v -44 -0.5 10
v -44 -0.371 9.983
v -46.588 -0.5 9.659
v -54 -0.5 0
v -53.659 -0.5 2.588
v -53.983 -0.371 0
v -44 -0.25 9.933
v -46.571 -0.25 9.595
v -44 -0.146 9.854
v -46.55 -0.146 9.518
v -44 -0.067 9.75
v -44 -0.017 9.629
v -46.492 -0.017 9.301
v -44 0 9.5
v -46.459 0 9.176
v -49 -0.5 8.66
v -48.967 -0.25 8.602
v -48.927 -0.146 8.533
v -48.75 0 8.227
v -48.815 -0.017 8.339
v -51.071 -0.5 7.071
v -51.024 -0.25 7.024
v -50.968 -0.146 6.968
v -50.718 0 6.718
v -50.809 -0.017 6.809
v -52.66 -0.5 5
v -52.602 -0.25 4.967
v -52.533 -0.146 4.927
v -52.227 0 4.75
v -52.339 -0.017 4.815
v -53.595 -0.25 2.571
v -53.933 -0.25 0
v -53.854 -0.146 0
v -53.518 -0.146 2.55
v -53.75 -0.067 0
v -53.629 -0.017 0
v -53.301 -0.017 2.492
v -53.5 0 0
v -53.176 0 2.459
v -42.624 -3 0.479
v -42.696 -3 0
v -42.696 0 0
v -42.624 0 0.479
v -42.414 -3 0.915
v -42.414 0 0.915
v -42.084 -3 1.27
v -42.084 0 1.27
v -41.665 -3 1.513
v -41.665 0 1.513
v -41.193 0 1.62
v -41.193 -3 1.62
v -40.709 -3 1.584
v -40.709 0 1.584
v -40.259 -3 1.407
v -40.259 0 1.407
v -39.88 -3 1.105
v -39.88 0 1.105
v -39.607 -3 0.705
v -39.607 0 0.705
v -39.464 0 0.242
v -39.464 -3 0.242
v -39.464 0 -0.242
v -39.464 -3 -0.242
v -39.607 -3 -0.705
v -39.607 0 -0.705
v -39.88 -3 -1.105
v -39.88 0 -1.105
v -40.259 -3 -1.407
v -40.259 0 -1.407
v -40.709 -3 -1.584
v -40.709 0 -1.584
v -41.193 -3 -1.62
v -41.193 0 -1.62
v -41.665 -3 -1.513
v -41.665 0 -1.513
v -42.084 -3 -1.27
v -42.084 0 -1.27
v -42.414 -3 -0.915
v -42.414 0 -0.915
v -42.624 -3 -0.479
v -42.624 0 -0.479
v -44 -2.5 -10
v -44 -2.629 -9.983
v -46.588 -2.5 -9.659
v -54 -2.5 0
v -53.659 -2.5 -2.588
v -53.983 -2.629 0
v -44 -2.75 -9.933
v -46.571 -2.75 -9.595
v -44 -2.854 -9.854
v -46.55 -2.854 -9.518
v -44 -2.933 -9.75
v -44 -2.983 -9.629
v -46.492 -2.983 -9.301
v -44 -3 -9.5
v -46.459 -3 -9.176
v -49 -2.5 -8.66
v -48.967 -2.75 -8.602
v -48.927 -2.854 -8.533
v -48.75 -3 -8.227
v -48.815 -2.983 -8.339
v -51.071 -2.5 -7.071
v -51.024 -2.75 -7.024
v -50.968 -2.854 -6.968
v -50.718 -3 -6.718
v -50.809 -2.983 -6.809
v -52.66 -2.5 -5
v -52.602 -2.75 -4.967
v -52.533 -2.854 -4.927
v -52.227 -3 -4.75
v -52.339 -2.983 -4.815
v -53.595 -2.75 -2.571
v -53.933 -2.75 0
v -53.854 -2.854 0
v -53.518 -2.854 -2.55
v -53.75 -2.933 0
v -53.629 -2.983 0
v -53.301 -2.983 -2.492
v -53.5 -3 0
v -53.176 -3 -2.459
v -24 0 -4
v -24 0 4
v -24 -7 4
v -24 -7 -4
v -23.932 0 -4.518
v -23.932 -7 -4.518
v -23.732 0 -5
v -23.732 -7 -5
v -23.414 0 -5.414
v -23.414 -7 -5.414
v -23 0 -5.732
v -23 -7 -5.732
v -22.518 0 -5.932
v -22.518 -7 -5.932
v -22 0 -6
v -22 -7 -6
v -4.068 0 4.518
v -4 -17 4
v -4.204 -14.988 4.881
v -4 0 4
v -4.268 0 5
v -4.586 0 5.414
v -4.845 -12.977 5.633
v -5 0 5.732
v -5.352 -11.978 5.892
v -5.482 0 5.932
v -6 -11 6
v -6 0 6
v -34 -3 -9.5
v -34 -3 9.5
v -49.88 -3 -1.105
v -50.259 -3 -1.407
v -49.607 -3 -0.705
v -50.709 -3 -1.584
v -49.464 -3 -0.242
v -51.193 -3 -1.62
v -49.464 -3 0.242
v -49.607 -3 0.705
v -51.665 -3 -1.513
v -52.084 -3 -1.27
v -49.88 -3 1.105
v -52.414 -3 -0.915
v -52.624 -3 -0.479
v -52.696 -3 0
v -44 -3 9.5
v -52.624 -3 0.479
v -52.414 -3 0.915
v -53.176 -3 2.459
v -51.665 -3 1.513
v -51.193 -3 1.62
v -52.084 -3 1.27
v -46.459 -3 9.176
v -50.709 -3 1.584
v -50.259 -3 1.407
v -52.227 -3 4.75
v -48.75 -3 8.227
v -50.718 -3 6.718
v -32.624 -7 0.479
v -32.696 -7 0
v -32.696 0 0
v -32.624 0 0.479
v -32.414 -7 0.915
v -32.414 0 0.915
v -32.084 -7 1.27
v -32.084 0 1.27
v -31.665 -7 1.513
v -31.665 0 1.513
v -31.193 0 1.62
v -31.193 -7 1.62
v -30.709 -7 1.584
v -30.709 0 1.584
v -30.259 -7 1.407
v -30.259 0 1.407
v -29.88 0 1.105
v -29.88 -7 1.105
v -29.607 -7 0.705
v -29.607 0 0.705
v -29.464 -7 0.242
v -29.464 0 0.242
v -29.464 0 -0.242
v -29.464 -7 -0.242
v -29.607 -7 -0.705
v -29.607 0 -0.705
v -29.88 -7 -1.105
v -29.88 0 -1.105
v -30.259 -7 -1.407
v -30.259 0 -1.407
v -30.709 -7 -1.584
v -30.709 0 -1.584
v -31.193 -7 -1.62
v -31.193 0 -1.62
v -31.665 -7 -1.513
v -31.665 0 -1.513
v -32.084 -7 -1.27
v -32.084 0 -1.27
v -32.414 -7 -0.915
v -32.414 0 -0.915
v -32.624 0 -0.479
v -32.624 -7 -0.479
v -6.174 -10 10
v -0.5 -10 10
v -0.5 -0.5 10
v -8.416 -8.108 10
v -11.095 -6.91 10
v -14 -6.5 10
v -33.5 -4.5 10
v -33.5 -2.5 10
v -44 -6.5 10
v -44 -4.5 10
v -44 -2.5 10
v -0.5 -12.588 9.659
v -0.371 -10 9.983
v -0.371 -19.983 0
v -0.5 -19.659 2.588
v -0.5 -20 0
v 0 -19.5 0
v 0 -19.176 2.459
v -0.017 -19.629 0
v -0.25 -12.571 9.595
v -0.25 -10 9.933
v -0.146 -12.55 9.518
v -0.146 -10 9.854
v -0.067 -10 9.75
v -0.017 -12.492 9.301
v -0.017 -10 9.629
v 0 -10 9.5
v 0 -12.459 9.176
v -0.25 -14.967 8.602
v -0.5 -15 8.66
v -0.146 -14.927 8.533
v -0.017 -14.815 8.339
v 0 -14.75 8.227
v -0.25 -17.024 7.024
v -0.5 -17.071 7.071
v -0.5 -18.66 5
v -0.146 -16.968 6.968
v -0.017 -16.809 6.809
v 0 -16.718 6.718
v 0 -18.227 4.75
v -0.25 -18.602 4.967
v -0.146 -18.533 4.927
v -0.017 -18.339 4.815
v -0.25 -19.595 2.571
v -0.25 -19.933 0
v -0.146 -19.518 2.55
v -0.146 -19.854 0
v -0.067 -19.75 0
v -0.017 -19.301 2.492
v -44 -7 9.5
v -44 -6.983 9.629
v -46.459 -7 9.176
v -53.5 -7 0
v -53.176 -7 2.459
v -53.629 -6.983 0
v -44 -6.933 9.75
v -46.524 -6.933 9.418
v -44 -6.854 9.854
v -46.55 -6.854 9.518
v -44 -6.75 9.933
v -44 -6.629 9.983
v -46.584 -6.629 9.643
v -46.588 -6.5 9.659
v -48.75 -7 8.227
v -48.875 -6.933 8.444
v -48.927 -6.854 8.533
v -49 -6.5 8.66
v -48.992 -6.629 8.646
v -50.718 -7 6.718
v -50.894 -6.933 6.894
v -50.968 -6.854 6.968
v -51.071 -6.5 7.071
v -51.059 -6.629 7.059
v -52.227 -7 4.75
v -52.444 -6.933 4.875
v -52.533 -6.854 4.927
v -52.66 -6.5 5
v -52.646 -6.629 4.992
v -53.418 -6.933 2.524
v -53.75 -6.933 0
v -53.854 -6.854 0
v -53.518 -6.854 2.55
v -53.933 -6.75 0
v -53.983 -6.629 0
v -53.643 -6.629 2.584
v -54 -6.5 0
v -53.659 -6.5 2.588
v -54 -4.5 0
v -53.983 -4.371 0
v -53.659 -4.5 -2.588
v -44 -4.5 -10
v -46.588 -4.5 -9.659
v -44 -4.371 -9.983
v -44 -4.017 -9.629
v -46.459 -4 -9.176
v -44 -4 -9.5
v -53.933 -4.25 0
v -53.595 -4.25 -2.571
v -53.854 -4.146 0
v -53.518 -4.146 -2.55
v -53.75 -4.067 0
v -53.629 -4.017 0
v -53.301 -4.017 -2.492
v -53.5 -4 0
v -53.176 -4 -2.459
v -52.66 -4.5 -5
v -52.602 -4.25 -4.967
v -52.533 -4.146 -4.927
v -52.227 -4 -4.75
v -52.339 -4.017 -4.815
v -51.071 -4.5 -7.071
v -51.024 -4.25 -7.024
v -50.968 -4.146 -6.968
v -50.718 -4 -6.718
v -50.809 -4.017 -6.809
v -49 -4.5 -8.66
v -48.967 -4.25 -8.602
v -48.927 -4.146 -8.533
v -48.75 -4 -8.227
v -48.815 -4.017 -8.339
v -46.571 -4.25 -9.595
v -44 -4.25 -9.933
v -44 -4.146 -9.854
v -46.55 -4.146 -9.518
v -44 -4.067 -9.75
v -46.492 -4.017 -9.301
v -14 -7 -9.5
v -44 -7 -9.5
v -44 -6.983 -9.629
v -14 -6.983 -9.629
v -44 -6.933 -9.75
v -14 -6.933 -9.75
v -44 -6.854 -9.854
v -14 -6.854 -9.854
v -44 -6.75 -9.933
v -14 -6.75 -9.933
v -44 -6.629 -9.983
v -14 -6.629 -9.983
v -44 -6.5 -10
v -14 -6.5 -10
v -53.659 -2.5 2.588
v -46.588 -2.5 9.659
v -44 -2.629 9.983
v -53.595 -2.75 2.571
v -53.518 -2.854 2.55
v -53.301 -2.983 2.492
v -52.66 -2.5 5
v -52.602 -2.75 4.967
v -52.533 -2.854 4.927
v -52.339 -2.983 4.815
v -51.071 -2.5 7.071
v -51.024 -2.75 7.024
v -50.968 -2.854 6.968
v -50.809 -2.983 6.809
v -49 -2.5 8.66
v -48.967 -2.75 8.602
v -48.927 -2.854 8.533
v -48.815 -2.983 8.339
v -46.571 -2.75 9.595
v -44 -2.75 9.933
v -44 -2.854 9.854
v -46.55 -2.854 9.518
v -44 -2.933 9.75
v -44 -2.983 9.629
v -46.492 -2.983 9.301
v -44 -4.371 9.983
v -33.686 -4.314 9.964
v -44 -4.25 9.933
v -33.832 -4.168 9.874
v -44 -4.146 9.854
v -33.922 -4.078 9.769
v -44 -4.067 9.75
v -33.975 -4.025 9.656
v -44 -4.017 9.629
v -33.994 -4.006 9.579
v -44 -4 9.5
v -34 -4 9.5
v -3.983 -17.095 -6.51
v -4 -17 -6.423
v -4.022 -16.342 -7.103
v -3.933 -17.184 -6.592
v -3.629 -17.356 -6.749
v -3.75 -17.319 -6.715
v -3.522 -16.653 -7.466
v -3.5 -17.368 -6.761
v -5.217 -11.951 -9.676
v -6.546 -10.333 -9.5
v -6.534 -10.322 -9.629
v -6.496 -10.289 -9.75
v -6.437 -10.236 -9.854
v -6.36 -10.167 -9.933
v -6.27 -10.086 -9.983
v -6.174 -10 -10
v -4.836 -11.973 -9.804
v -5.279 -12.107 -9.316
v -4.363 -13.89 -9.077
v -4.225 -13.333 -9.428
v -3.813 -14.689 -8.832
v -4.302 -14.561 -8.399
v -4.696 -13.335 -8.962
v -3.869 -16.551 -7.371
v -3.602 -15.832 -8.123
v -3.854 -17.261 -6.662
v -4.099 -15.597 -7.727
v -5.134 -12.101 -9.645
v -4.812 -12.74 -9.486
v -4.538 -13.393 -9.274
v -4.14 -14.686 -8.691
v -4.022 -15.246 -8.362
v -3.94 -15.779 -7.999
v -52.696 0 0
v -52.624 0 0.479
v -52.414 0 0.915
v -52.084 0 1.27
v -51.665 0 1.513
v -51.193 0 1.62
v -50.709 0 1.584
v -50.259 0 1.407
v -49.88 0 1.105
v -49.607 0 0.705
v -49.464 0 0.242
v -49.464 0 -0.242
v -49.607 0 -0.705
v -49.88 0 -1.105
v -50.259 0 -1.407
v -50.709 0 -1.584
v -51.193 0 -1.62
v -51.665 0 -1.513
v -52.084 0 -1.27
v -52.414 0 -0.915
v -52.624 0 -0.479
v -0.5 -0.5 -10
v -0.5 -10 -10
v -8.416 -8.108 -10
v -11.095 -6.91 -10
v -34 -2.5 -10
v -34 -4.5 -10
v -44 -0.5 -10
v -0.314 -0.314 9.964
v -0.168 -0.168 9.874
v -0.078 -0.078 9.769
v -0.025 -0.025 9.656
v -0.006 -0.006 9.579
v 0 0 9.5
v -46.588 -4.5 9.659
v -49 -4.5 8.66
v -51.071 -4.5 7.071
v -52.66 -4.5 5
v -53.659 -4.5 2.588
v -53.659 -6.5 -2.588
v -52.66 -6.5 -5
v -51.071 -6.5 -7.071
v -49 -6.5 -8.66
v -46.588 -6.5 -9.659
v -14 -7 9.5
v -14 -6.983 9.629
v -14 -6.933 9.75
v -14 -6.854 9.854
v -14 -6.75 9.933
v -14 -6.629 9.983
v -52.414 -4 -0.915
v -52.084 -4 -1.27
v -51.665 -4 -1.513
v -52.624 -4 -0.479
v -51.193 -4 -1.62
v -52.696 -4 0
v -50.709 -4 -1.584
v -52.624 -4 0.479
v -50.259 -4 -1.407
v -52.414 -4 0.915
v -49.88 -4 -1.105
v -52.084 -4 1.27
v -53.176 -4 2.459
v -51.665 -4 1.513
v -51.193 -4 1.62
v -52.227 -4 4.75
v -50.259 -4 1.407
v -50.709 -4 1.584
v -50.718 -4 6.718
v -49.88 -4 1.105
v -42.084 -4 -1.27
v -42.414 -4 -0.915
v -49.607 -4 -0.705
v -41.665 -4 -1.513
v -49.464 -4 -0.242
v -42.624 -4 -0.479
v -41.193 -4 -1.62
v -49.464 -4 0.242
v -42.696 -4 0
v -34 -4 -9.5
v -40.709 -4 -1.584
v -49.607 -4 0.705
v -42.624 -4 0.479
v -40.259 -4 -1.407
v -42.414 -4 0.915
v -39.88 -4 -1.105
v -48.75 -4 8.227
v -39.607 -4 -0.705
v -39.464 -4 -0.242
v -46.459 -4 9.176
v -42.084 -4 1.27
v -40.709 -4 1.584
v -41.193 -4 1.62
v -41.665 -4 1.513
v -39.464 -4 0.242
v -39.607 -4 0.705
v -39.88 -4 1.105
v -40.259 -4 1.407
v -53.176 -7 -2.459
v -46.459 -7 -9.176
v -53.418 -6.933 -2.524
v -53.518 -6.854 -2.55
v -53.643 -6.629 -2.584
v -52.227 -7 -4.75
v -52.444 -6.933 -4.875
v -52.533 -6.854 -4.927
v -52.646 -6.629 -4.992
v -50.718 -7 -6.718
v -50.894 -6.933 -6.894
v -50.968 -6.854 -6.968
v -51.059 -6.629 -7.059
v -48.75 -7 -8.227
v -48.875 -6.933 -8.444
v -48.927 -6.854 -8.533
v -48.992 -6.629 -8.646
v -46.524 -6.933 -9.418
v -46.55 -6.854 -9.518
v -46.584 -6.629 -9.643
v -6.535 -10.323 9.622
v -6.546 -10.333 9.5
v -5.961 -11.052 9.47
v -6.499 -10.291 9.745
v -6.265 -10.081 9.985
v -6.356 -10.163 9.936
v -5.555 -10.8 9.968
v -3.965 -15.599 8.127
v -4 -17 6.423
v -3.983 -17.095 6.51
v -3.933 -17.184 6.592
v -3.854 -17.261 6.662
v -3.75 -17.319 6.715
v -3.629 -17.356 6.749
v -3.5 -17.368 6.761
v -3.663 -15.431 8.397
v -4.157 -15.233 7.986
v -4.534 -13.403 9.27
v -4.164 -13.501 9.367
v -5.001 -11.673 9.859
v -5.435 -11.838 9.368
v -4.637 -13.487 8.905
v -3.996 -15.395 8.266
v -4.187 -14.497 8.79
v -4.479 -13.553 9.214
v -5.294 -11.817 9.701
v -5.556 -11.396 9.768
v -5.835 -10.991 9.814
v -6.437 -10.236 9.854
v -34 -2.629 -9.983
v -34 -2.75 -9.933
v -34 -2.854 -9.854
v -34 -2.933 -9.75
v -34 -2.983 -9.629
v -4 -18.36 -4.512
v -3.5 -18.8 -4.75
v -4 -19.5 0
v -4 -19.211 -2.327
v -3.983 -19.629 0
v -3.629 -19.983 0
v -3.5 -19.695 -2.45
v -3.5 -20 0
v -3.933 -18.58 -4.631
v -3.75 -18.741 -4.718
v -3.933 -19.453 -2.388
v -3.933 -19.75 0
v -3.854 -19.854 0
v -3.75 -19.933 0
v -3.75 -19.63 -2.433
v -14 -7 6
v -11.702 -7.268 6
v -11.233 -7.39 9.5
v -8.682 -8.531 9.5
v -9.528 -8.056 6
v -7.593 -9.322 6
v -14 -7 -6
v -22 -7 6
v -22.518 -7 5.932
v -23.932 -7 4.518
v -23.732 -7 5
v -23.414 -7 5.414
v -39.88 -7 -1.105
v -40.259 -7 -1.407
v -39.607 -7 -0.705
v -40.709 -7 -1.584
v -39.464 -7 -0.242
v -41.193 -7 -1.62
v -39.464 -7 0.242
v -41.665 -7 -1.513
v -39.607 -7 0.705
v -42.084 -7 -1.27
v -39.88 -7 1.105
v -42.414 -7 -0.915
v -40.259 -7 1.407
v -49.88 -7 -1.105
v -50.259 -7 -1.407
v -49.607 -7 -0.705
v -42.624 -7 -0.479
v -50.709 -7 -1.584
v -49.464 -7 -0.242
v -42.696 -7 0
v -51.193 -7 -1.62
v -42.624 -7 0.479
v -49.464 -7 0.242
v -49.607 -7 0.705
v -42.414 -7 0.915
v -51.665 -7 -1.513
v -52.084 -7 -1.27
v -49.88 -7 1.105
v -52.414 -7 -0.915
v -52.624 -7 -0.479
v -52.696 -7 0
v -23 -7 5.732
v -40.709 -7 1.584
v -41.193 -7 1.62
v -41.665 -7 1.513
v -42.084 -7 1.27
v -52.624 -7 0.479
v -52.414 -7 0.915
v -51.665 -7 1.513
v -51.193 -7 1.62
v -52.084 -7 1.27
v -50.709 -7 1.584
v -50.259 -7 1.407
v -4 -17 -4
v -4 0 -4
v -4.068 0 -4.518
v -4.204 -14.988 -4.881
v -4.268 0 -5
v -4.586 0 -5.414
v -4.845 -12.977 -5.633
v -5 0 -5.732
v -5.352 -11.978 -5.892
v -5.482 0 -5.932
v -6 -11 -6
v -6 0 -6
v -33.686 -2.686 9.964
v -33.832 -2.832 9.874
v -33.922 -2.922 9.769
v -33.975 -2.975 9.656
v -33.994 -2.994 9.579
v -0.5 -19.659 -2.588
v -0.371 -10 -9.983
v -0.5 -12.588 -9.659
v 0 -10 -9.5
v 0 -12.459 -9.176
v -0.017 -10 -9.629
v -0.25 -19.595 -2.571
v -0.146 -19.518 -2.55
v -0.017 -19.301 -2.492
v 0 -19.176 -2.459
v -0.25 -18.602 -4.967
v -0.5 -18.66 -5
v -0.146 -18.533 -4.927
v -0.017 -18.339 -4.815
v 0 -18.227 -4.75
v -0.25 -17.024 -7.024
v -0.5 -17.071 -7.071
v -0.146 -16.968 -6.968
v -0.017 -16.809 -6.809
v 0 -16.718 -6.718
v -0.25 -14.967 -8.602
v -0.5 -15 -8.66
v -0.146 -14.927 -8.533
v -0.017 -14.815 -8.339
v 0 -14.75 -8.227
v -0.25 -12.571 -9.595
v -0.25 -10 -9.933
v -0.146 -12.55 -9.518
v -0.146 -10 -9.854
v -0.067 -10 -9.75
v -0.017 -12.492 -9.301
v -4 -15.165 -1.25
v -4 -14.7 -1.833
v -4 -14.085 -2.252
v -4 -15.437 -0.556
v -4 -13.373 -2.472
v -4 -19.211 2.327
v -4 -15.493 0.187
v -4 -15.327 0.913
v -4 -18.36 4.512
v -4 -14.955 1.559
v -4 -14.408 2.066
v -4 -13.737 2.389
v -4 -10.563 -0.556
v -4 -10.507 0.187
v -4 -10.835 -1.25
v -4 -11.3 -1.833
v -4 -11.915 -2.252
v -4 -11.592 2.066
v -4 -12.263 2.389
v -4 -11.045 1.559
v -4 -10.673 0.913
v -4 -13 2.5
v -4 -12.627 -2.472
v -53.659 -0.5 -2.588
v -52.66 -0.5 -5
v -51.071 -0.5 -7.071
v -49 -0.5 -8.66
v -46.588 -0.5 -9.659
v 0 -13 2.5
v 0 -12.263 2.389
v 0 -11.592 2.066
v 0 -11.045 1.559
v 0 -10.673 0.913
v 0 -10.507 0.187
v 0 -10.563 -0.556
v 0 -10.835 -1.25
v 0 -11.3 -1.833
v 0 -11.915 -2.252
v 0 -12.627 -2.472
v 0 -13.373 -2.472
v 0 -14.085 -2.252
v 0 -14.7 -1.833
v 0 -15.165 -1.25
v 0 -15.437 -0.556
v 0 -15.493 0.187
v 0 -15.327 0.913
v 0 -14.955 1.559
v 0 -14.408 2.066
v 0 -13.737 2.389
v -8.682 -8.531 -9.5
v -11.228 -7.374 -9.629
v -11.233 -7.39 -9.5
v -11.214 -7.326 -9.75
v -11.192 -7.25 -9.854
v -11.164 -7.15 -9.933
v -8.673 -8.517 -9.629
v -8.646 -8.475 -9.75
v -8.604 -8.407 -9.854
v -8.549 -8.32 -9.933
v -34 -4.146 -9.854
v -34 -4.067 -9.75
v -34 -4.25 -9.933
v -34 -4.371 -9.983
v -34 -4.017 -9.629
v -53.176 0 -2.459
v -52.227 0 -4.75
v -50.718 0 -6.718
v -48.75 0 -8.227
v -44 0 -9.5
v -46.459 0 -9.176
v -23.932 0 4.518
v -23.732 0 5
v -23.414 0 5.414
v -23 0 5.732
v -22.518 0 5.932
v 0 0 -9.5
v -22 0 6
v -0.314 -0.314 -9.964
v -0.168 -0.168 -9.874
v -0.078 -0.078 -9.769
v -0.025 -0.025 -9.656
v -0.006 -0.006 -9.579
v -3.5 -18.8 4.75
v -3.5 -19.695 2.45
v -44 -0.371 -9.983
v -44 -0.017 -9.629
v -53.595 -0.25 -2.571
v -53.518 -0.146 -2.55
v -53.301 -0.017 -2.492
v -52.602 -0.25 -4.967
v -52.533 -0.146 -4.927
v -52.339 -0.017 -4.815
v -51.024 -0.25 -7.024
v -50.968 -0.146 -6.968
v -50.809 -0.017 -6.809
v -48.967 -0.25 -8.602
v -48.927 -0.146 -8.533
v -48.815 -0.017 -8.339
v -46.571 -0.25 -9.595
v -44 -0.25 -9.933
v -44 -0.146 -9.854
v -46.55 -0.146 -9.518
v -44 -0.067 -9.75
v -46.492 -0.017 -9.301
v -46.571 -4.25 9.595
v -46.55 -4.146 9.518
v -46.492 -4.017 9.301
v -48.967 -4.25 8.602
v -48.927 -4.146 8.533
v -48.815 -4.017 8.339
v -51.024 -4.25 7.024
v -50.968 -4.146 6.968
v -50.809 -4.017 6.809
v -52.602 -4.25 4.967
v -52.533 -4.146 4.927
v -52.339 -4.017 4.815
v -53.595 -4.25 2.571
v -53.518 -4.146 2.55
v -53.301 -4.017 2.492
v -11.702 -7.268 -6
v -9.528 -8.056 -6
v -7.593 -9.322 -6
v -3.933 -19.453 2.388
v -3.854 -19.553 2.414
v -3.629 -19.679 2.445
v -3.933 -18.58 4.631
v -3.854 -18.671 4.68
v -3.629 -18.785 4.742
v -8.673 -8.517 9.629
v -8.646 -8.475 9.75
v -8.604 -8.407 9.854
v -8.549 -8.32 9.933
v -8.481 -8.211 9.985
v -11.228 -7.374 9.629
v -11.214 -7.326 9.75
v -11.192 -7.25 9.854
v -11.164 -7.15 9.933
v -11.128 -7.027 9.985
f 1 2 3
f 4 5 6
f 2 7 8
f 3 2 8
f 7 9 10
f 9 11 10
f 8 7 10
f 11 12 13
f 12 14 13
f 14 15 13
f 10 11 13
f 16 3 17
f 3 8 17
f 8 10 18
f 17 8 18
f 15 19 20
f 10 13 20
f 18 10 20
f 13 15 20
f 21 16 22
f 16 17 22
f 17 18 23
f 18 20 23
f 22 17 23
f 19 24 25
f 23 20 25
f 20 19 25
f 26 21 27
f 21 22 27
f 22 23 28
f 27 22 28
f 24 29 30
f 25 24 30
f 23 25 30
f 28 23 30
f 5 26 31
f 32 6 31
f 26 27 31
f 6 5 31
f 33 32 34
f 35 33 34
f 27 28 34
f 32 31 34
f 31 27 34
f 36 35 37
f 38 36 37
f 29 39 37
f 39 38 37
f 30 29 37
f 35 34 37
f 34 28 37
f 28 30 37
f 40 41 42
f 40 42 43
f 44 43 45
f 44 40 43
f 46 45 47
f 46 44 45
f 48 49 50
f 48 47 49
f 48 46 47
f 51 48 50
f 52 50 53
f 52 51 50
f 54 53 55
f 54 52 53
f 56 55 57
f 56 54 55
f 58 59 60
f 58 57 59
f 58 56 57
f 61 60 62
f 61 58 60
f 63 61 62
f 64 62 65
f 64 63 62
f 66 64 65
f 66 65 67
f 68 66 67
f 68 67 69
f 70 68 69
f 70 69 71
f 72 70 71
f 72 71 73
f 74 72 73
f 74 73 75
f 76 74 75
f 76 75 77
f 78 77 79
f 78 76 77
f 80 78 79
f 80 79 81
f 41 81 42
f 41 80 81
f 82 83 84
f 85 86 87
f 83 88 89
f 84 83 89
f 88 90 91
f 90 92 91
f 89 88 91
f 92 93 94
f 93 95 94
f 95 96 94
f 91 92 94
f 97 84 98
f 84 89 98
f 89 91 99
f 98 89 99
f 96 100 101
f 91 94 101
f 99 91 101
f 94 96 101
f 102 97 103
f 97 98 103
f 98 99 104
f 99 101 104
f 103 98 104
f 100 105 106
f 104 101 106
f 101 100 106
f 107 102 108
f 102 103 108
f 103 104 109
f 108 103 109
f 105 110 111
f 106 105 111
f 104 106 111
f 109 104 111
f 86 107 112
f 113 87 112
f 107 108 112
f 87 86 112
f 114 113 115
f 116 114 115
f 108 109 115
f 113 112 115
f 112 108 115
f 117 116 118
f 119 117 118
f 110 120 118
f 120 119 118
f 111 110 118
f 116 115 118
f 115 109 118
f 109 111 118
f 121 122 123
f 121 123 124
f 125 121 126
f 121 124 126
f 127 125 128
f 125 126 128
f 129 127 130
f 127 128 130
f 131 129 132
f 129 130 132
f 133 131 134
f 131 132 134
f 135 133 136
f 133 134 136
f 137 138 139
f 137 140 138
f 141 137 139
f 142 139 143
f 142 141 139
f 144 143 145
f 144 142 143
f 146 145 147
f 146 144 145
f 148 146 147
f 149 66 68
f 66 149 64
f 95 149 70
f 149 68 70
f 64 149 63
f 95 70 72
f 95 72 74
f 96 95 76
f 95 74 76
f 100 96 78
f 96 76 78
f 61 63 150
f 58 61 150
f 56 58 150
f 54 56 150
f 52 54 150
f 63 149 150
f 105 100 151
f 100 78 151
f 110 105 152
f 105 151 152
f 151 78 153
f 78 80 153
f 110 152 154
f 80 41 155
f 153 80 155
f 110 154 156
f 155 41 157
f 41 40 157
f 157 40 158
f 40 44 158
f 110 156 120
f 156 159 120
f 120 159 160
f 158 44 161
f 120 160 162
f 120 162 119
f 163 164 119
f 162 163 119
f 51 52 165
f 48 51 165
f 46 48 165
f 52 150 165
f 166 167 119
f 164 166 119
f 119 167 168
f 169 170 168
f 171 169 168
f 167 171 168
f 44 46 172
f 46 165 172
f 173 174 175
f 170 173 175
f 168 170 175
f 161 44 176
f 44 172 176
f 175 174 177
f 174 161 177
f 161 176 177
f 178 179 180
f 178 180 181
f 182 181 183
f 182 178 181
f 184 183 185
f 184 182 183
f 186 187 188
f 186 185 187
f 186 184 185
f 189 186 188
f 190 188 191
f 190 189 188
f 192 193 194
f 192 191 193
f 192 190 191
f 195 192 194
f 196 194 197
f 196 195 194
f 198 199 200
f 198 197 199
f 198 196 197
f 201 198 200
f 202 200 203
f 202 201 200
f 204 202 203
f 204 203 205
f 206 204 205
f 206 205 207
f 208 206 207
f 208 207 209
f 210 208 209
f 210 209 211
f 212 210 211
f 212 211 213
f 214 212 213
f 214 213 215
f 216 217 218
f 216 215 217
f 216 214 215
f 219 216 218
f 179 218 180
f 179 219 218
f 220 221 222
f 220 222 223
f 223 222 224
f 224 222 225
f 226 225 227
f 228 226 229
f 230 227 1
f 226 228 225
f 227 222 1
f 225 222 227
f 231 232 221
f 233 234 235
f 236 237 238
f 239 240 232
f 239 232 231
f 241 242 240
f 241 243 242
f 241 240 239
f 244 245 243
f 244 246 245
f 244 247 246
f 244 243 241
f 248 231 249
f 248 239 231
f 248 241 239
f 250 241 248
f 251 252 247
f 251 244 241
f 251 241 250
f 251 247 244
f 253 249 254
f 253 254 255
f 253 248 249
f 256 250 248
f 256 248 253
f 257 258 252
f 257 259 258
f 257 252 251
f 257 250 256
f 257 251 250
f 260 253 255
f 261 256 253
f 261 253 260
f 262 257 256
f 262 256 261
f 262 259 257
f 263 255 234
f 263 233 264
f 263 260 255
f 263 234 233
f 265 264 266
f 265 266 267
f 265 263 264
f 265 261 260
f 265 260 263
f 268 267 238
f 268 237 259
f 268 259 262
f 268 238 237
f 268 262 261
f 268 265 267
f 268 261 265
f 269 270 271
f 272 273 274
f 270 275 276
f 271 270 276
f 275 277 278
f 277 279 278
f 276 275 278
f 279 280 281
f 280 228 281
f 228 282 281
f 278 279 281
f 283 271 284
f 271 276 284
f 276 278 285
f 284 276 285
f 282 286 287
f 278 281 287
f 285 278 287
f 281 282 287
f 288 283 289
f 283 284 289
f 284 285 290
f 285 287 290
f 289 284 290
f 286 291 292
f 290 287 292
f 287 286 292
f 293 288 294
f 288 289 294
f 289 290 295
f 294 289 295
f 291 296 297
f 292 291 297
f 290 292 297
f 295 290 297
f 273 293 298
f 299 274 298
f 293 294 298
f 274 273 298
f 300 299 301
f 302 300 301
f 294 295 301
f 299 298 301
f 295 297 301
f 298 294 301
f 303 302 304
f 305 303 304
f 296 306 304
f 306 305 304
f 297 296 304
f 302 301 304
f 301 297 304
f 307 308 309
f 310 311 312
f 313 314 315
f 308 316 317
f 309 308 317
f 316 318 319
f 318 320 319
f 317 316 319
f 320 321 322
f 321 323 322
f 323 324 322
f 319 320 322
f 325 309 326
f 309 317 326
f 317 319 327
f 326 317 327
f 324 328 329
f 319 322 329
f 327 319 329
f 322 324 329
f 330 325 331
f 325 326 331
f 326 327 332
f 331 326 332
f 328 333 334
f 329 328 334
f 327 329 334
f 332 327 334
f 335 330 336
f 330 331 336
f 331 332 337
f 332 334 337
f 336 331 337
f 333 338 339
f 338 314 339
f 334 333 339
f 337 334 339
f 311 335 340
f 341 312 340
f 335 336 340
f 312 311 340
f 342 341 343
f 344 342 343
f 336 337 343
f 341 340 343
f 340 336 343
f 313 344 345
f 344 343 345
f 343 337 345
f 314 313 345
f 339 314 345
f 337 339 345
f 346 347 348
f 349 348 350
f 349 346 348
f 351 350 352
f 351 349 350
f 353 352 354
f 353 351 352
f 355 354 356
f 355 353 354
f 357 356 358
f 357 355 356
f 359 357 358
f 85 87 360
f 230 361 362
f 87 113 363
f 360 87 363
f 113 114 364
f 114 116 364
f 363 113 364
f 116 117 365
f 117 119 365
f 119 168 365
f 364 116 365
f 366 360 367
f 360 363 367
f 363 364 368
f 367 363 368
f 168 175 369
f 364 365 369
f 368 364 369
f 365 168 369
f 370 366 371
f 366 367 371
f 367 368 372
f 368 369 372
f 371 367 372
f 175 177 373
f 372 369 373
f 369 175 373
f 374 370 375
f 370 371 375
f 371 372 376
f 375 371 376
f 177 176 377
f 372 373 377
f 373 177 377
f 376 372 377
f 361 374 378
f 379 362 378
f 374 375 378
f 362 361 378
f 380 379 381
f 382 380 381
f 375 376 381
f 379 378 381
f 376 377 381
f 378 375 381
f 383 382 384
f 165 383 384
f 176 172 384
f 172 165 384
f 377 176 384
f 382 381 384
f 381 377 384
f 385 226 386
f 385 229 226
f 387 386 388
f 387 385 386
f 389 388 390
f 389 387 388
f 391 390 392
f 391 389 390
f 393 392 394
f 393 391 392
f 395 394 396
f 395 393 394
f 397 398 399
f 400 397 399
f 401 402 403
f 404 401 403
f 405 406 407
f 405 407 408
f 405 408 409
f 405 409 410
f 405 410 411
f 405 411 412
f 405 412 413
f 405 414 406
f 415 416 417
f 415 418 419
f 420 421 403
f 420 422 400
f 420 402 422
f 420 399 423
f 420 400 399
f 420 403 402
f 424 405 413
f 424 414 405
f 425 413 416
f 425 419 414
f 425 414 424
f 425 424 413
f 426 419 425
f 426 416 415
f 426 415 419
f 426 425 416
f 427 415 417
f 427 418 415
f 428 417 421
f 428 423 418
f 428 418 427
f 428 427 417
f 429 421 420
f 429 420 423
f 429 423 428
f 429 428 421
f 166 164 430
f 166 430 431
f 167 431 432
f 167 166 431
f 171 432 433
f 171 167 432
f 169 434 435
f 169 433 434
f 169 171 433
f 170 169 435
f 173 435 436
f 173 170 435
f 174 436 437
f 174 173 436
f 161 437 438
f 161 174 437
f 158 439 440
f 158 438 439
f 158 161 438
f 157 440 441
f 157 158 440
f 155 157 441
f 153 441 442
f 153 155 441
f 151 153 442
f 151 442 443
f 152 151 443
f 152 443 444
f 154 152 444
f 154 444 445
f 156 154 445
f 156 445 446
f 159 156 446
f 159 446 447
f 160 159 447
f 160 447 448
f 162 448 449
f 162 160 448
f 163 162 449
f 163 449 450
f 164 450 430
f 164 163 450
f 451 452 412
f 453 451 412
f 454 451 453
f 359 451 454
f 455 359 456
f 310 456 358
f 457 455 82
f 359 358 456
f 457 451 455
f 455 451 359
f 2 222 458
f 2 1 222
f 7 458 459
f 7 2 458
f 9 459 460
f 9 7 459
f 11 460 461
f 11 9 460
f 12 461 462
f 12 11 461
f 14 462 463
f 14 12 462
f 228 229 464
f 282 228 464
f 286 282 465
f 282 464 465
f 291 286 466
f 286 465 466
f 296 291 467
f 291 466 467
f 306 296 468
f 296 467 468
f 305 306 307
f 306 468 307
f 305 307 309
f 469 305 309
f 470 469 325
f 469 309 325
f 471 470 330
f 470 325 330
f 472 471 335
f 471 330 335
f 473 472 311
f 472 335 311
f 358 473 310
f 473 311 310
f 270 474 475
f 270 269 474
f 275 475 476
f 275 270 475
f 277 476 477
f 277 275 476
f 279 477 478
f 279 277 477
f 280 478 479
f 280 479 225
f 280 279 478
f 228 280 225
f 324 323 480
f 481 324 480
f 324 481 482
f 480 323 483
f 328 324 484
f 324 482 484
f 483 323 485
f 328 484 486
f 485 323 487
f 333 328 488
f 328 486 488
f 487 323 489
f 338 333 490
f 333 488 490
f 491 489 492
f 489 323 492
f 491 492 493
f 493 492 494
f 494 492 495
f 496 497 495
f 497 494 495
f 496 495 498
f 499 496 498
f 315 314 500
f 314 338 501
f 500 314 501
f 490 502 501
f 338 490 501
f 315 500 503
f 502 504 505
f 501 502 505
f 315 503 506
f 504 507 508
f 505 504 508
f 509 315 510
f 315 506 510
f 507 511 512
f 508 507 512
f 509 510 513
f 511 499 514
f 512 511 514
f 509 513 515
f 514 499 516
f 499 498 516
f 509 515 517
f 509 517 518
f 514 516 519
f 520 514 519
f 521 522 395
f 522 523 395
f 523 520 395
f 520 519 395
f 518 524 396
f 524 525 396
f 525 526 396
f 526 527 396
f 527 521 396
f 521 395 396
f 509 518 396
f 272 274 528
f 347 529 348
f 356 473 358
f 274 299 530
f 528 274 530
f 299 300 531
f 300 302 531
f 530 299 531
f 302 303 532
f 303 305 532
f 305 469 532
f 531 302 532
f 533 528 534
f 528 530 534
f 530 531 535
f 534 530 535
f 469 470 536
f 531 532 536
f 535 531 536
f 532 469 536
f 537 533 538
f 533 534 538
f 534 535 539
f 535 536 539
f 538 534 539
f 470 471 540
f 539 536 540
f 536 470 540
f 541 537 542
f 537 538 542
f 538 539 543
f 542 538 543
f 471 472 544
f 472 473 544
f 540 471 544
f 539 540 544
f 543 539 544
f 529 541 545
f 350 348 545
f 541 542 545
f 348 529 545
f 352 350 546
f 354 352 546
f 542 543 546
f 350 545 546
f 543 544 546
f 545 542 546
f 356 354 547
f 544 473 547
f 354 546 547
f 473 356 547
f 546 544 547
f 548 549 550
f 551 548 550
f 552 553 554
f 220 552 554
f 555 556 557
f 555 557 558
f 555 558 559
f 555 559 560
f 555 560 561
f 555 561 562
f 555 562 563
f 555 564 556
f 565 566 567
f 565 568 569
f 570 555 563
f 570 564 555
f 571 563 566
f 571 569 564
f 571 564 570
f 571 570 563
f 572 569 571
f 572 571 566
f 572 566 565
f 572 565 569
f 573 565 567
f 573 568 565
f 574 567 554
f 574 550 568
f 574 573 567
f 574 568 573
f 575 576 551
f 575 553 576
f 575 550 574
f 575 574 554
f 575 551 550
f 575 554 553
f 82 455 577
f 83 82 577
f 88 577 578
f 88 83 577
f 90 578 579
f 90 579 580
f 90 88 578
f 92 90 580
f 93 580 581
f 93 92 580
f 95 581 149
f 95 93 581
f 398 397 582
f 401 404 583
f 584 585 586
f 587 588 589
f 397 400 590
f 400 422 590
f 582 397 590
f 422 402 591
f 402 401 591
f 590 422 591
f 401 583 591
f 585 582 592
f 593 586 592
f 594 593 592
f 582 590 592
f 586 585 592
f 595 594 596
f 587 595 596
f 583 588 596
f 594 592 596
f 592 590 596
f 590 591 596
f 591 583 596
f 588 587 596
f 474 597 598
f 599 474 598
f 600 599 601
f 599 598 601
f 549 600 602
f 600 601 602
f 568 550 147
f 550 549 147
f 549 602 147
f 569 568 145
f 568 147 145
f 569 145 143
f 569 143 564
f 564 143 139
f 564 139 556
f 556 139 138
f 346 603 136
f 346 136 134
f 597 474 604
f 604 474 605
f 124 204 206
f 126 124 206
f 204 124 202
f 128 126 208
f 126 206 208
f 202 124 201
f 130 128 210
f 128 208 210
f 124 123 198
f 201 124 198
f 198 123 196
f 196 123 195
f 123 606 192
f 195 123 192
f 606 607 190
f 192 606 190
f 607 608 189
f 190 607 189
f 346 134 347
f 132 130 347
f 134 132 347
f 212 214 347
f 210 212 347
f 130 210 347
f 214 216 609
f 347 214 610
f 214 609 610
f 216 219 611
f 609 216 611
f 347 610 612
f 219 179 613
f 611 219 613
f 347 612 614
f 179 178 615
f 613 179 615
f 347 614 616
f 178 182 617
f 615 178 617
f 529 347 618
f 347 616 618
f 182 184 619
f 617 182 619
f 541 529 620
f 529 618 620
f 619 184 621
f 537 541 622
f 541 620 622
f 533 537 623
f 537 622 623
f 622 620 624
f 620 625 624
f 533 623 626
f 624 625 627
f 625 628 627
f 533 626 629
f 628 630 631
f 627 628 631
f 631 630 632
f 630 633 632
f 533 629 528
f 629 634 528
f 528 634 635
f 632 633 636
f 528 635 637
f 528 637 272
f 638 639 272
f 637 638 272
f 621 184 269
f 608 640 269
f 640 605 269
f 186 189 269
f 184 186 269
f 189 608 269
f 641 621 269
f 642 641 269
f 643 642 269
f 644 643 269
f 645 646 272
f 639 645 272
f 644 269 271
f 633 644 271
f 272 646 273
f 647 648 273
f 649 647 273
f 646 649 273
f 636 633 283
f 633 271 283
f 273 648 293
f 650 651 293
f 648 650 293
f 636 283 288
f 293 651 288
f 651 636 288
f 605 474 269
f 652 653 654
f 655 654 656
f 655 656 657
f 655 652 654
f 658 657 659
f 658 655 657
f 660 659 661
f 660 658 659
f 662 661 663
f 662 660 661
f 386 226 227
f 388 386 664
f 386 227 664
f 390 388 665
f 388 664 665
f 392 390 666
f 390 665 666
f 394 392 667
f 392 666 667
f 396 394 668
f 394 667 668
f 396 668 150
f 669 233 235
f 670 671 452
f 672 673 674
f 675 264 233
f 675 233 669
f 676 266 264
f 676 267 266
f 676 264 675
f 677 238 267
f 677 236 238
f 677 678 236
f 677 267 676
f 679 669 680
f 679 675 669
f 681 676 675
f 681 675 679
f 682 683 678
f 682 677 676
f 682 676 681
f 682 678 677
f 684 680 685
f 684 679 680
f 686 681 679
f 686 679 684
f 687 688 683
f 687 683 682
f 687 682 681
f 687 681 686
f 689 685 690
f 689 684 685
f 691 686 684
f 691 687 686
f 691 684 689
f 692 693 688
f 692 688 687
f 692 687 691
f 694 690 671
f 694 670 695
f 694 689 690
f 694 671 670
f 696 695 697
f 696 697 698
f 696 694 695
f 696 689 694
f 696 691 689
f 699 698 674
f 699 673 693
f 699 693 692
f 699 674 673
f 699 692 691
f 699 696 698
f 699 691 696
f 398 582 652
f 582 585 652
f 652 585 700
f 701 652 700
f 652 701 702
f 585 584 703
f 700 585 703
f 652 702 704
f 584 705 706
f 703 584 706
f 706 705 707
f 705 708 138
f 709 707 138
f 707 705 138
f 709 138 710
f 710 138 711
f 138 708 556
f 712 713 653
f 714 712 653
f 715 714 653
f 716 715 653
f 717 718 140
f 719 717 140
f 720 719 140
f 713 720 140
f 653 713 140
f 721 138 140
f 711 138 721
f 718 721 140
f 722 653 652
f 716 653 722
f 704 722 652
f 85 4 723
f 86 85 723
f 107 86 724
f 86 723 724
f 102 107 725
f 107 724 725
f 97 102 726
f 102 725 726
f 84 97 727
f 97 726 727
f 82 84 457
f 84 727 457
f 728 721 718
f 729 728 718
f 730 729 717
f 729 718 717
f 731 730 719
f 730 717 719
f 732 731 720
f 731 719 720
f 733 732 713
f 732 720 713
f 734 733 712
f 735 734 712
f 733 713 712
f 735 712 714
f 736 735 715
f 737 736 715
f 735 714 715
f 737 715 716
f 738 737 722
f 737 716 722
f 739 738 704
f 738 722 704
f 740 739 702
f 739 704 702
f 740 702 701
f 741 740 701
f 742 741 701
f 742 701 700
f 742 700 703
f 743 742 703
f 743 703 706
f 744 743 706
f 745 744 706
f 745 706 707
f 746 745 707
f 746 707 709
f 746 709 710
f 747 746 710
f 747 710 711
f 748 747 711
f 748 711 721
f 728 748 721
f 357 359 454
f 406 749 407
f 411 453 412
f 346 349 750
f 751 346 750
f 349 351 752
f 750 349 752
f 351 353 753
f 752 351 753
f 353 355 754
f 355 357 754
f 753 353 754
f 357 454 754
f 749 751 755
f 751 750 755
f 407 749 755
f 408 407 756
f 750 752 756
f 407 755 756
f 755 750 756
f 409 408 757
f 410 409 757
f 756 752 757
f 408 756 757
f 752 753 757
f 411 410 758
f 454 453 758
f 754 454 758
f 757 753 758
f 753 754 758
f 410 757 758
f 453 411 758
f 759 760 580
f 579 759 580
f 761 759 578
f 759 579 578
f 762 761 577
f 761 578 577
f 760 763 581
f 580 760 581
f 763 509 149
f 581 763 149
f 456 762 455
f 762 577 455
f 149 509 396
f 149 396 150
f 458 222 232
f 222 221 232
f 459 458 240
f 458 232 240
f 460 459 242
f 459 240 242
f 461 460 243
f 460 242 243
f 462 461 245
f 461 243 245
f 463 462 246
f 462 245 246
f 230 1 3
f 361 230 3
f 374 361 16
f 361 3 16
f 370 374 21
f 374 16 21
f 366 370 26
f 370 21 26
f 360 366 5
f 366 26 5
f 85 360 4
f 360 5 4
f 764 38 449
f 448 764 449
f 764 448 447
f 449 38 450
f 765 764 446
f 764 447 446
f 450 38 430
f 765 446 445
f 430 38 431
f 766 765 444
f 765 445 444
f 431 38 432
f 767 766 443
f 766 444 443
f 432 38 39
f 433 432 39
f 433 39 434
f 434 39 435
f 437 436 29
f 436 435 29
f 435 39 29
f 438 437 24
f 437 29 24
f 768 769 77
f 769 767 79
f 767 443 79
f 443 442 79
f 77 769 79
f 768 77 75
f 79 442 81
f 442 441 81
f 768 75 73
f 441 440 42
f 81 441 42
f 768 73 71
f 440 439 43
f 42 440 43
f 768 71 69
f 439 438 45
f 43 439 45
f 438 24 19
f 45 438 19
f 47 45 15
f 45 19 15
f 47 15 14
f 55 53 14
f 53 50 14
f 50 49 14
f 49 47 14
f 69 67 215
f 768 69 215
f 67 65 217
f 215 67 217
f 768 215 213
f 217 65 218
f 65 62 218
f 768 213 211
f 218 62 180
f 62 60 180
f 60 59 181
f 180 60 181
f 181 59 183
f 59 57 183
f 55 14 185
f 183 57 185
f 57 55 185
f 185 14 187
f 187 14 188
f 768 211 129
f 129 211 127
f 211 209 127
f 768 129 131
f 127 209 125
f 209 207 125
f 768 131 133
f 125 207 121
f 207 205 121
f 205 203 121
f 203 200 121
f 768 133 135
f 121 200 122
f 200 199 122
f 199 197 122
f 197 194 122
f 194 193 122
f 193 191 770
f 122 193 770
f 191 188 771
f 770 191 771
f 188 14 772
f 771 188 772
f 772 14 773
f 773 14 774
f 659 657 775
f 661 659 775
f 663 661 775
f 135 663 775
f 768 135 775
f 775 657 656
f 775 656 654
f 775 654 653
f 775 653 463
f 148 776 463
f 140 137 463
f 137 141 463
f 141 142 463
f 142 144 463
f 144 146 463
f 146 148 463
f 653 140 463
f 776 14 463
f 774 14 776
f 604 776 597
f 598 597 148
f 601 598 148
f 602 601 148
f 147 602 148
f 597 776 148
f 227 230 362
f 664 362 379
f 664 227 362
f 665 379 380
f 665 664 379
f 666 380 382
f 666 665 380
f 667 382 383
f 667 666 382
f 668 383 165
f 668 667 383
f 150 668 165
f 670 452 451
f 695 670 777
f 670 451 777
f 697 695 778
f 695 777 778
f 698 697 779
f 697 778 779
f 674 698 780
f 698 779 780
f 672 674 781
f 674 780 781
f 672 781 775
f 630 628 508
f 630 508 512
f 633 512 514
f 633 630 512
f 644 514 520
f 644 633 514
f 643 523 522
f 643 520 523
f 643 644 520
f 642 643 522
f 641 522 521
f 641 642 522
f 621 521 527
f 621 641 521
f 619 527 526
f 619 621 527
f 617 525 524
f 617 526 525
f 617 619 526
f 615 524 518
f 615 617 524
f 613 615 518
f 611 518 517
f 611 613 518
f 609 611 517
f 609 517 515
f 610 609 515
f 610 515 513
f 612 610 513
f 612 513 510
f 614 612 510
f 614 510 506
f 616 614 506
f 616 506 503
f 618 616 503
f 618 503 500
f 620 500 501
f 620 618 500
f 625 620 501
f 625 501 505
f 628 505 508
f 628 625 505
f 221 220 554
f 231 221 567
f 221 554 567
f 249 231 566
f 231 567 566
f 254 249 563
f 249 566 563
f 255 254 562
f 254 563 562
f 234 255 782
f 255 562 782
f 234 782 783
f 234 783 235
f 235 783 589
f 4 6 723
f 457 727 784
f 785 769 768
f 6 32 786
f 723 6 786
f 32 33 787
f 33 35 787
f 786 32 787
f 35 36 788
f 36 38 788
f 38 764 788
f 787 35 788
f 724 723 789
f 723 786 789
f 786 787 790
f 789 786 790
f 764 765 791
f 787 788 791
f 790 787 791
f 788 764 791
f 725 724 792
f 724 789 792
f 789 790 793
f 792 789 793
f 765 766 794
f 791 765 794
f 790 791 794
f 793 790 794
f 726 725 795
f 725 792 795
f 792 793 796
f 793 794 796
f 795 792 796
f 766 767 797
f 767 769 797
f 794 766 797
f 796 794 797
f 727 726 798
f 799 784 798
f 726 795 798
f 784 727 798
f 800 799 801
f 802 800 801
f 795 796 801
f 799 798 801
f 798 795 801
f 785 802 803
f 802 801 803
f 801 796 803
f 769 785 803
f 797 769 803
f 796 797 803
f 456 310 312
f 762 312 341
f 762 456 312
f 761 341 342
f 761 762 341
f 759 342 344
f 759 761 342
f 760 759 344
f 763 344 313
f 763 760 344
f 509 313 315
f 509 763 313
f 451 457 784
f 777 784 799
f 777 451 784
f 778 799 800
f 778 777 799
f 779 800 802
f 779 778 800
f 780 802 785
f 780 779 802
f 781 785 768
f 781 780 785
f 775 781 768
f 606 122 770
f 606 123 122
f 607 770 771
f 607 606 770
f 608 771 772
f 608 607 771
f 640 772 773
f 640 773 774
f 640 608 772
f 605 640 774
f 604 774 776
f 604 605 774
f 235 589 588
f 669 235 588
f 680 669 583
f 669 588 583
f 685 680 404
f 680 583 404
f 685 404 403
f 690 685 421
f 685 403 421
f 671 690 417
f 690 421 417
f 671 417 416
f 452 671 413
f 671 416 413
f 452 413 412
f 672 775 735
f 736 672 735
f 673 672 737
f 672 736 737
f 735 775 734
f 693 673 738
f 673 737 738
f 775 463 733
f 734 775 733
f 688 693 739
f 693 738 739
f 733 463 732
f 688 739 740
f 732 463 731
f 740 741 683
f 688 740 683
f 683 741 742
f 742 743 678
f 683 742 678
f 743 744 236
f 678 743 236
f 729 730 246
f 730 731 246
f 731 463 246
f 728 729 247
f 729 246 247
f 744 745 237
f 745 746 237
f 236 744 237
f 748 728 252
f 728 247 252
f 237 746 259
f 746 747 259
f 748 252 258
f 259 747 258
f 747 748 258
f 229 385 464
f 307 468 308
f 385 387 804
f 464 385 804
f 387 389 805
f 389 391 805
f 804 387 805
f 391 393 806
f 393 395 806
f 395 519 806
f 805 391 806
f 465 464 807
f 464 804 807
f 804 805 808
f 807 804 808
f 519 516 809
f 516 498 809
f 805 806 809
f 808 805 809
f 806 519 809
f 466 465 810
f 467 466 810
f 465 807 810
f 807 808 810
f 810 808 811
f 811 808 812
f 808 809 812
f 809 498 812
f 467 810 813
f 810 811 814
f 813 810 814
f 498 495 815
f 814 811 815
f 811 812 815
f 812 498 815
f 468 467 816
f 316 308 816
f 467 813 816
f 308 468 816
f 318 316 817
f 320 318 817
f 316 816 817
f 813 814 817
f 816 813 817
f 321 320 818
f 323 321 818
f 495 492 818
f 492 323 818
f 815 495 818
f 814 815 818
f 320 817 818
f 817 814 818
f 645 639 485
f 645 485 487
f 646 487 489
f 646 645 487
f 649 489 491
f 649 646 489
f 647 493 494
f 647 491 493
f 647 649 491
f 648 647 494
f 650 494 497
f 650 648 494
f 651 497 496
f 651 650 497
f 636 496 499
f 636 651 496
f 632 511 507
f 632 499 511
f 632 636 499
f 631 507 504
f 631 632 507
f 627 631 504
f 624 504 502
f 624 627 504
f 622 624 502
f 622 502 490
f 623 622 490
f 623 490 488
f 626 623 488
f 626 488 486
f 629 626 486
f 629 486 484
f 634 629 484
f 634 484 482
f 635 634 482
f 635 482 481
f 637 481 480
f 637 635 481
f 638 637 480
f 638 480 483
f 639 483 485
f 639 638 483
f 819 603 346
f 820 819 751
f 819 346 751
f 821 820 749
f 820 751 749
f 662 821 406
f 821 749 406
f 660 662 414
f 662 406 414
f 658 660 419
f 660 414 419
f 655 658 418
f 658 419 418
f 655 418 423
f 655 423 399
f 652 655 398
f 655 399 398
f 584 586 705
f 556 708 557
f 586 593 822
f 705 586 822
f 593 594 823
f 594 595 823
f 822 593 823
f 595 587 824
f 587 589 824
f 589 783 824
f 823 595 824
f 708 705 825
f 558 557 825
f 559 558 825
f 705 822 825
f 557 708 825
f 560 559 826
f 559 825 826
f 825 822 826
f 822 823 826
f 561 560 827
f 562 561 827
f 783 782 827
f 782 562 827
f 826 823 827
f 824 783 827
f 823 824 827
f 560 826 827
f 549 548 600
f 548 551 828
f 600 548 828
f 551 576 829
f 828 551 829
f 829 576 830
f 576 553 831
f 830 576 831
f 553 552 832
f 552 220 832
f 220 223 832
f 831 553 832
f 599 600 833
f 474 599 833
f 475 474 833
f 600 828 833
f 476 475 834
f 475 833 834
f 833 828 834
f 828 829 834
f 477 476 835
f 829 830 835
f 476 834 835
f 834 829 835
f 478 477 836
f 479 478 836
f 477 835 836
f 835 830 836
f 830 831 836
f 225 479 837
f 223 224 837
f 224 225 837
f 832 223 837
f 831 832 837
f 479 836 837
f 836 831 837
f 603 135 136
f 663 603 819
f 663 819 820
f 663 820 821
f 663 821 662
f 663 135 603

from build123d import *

# Parameters (mm, degrees)
BOSS_EXTRUDE1_DEPTH     = 10
FILLET1_R               = 10
CUT_EXTRUDE1_DEPTH      = 59.446556785
CUT_EXTRUDE1_DEPTH_BACK = 59.446556785
SKETCH3_R               = 1.625
FILLET2_R               = 10
SKETCH4_R               = 2.5
CUT_EXTRUDE2_DEPTH      = 55.772255751
SKETCH5_W               = 20
SKETCH5_H               = 12
CUT_EXTRUDE3_DEPTH      = 59.446556785
FILLET3_R               = 10
FILLET5_R               = 0.5
FILLET6_R               = 2


with BuildPart() as part:
    # Sketch1 → Boss-Extrude1 (new, symmetric)
    with BuildSketch(Plane.XY):
        Polygon((0, 0), (0, -20), (-4, -20), (-4, -7), (-54, -7), (-54, -4), (-34, -4), (-34, -3), (-54, -3), (-54, 0), align=None)
    extrude(amount=BOSS_EXTRUDE1_DEPTH, both=True)

    # Fillet1
    fillet1_edges = [part.edges().sort_by_distance(p)[0] for p in [
        (-54, -5.5, -10),
        (-54, -1.5, -10),
        (-54, -5.5, 10),
        (-54, -1.5, 10),
    ]]
    fillet(fillet1_edges, radius=FILLET1_R - 0.0001)  # a hair under: the kernel refuses the full size

    # Sketch3 → Cut-Extrude1 (cut, two sides: drawn at the far end of the back side and taken through both)
    with BuildSketch(Plane(origin=(0, 0, 0), x_dir=(1, 0, 0), z_dir=(0, 1, 0)).offset(-CUT_EXTRUDE1_DEPTH_BACK)):
        with Locations(Location((-51.071067812, 0, 0), (0, 0, 180))):
            Circle(SKETCH3_R)
        with Locations(Location((-41.071067812, 0, 0), (0, 0, 180))):
            Circle(SKETCH3_R)
        with Locations(Location((-31.071067812, 0, 0), (0, 0, 180))):
            Circle(SKETCH3_R)
    extrude(amount=CUT_EXTRUDE1_DEPTH + CUT_EXTRUDE1_DEPTH_BACK, mode=Mode.SUBTRACT)

    # Fillet2
    fillet2_edges = [part.edges().sort_by_distance(p)[0] for p in [
        (-2, -20, 10),
        (-2, -20, -10),
    ]]
    fillet(fillet2_edges, radius=FILLET2_R - 0.0001)  # a hair under: the kernel refuses the full size

    # Sketch4 → Cut-Extrude2 (cut, through all)
    with BuildSketch(Plane.ZY.offset(4)):
        with Locations((0, -13)):
            Circle(SKETCH4_R)
    extrude(amount=-CUT_EXTRUDE2_DEPTH, mode=Mode.SUBTRACT)

    # Sketch5 → Cut-Extrude3 (cut, through all)
    with BuildSketch(Plane(origin=(0, 0, 0), x_dir=(1, 0, 0), z_dir=(0, 1, 0))):
        with Locations((-14, 0)):
            Rectangle(SKETCH5_W, SKETCH5_H)
    extrude(amount=-CUT_EXTRUDE3_DEPTH, mode=Mode.SUBTRACT)

    # Fillet3
    fillet3_edges = [part.edges().sort_by_distance(p)[0] for p in [
        (-4, -7, -8),
        (-4, -7, 8),
    ]]
    fillet(fillet3_edges, radius=FILLET3_R)

    # Fillet5
    fillet5_edges = [part.edges().sort_by_distance(p)[0] for p in [
        (-4, -19.219544127, -3.873063981),
        (-4.63248147, -13.50005763, -9.367506076),
        (-10.126952105, -7.780482659, -10),
        (-10.126952105, -7.780482659, 10),
        (-4.63248147, -13.50005763, 9.367506076),
        (-39.00005, -4, -10),
        (-22.00005, 0, -10),
        (-34, -3.5, 10),
        (-39.00005, -4, 10),
        (-29.00005, -7, -10),
        (-29.00005, -7, 10),
        (-51.071097101, -7, 7.071097101),
        (-51.071097101, -7, -7.071097101),
        (-39.00005, -3, -10),
        (-51.071097101, -4, 7.071097101),
        (-51.071097101, -4, -7.071097101),
        (-39.00005, -3, 10),
        (-51.071097101, -3, 7.071097101),
        (-51.071097101, -3, -7.071097101),
        (-51.071097101, 0, 7.071097101),
        (-51.071097101, 0, -7.071097101),
        (-22.00005, 0, 10),
        (0, -5.00005, 10),
        (0, -5.00005, -10),
        (0, -17.071097101, -7.071097101),
        (0, -17.071097101, 7.071097101),
        (-4, -19.219544127, 3.873063981),
    ]]
    fillet(fillet5_edges, radius=FILLET5_R)

    # Fillet6
    fillet6_edges = [part.edges().sort_by_distance(p)[0] for p in [
        (-24, -3.5, 6),
        (-4, -8.5, 6),
        (-24, -3.5, -6),
        (-4, -8.5, -6),
    ]]
    fillet(fillet6_edges, radius=FILLET6_R)


solid = part.part
